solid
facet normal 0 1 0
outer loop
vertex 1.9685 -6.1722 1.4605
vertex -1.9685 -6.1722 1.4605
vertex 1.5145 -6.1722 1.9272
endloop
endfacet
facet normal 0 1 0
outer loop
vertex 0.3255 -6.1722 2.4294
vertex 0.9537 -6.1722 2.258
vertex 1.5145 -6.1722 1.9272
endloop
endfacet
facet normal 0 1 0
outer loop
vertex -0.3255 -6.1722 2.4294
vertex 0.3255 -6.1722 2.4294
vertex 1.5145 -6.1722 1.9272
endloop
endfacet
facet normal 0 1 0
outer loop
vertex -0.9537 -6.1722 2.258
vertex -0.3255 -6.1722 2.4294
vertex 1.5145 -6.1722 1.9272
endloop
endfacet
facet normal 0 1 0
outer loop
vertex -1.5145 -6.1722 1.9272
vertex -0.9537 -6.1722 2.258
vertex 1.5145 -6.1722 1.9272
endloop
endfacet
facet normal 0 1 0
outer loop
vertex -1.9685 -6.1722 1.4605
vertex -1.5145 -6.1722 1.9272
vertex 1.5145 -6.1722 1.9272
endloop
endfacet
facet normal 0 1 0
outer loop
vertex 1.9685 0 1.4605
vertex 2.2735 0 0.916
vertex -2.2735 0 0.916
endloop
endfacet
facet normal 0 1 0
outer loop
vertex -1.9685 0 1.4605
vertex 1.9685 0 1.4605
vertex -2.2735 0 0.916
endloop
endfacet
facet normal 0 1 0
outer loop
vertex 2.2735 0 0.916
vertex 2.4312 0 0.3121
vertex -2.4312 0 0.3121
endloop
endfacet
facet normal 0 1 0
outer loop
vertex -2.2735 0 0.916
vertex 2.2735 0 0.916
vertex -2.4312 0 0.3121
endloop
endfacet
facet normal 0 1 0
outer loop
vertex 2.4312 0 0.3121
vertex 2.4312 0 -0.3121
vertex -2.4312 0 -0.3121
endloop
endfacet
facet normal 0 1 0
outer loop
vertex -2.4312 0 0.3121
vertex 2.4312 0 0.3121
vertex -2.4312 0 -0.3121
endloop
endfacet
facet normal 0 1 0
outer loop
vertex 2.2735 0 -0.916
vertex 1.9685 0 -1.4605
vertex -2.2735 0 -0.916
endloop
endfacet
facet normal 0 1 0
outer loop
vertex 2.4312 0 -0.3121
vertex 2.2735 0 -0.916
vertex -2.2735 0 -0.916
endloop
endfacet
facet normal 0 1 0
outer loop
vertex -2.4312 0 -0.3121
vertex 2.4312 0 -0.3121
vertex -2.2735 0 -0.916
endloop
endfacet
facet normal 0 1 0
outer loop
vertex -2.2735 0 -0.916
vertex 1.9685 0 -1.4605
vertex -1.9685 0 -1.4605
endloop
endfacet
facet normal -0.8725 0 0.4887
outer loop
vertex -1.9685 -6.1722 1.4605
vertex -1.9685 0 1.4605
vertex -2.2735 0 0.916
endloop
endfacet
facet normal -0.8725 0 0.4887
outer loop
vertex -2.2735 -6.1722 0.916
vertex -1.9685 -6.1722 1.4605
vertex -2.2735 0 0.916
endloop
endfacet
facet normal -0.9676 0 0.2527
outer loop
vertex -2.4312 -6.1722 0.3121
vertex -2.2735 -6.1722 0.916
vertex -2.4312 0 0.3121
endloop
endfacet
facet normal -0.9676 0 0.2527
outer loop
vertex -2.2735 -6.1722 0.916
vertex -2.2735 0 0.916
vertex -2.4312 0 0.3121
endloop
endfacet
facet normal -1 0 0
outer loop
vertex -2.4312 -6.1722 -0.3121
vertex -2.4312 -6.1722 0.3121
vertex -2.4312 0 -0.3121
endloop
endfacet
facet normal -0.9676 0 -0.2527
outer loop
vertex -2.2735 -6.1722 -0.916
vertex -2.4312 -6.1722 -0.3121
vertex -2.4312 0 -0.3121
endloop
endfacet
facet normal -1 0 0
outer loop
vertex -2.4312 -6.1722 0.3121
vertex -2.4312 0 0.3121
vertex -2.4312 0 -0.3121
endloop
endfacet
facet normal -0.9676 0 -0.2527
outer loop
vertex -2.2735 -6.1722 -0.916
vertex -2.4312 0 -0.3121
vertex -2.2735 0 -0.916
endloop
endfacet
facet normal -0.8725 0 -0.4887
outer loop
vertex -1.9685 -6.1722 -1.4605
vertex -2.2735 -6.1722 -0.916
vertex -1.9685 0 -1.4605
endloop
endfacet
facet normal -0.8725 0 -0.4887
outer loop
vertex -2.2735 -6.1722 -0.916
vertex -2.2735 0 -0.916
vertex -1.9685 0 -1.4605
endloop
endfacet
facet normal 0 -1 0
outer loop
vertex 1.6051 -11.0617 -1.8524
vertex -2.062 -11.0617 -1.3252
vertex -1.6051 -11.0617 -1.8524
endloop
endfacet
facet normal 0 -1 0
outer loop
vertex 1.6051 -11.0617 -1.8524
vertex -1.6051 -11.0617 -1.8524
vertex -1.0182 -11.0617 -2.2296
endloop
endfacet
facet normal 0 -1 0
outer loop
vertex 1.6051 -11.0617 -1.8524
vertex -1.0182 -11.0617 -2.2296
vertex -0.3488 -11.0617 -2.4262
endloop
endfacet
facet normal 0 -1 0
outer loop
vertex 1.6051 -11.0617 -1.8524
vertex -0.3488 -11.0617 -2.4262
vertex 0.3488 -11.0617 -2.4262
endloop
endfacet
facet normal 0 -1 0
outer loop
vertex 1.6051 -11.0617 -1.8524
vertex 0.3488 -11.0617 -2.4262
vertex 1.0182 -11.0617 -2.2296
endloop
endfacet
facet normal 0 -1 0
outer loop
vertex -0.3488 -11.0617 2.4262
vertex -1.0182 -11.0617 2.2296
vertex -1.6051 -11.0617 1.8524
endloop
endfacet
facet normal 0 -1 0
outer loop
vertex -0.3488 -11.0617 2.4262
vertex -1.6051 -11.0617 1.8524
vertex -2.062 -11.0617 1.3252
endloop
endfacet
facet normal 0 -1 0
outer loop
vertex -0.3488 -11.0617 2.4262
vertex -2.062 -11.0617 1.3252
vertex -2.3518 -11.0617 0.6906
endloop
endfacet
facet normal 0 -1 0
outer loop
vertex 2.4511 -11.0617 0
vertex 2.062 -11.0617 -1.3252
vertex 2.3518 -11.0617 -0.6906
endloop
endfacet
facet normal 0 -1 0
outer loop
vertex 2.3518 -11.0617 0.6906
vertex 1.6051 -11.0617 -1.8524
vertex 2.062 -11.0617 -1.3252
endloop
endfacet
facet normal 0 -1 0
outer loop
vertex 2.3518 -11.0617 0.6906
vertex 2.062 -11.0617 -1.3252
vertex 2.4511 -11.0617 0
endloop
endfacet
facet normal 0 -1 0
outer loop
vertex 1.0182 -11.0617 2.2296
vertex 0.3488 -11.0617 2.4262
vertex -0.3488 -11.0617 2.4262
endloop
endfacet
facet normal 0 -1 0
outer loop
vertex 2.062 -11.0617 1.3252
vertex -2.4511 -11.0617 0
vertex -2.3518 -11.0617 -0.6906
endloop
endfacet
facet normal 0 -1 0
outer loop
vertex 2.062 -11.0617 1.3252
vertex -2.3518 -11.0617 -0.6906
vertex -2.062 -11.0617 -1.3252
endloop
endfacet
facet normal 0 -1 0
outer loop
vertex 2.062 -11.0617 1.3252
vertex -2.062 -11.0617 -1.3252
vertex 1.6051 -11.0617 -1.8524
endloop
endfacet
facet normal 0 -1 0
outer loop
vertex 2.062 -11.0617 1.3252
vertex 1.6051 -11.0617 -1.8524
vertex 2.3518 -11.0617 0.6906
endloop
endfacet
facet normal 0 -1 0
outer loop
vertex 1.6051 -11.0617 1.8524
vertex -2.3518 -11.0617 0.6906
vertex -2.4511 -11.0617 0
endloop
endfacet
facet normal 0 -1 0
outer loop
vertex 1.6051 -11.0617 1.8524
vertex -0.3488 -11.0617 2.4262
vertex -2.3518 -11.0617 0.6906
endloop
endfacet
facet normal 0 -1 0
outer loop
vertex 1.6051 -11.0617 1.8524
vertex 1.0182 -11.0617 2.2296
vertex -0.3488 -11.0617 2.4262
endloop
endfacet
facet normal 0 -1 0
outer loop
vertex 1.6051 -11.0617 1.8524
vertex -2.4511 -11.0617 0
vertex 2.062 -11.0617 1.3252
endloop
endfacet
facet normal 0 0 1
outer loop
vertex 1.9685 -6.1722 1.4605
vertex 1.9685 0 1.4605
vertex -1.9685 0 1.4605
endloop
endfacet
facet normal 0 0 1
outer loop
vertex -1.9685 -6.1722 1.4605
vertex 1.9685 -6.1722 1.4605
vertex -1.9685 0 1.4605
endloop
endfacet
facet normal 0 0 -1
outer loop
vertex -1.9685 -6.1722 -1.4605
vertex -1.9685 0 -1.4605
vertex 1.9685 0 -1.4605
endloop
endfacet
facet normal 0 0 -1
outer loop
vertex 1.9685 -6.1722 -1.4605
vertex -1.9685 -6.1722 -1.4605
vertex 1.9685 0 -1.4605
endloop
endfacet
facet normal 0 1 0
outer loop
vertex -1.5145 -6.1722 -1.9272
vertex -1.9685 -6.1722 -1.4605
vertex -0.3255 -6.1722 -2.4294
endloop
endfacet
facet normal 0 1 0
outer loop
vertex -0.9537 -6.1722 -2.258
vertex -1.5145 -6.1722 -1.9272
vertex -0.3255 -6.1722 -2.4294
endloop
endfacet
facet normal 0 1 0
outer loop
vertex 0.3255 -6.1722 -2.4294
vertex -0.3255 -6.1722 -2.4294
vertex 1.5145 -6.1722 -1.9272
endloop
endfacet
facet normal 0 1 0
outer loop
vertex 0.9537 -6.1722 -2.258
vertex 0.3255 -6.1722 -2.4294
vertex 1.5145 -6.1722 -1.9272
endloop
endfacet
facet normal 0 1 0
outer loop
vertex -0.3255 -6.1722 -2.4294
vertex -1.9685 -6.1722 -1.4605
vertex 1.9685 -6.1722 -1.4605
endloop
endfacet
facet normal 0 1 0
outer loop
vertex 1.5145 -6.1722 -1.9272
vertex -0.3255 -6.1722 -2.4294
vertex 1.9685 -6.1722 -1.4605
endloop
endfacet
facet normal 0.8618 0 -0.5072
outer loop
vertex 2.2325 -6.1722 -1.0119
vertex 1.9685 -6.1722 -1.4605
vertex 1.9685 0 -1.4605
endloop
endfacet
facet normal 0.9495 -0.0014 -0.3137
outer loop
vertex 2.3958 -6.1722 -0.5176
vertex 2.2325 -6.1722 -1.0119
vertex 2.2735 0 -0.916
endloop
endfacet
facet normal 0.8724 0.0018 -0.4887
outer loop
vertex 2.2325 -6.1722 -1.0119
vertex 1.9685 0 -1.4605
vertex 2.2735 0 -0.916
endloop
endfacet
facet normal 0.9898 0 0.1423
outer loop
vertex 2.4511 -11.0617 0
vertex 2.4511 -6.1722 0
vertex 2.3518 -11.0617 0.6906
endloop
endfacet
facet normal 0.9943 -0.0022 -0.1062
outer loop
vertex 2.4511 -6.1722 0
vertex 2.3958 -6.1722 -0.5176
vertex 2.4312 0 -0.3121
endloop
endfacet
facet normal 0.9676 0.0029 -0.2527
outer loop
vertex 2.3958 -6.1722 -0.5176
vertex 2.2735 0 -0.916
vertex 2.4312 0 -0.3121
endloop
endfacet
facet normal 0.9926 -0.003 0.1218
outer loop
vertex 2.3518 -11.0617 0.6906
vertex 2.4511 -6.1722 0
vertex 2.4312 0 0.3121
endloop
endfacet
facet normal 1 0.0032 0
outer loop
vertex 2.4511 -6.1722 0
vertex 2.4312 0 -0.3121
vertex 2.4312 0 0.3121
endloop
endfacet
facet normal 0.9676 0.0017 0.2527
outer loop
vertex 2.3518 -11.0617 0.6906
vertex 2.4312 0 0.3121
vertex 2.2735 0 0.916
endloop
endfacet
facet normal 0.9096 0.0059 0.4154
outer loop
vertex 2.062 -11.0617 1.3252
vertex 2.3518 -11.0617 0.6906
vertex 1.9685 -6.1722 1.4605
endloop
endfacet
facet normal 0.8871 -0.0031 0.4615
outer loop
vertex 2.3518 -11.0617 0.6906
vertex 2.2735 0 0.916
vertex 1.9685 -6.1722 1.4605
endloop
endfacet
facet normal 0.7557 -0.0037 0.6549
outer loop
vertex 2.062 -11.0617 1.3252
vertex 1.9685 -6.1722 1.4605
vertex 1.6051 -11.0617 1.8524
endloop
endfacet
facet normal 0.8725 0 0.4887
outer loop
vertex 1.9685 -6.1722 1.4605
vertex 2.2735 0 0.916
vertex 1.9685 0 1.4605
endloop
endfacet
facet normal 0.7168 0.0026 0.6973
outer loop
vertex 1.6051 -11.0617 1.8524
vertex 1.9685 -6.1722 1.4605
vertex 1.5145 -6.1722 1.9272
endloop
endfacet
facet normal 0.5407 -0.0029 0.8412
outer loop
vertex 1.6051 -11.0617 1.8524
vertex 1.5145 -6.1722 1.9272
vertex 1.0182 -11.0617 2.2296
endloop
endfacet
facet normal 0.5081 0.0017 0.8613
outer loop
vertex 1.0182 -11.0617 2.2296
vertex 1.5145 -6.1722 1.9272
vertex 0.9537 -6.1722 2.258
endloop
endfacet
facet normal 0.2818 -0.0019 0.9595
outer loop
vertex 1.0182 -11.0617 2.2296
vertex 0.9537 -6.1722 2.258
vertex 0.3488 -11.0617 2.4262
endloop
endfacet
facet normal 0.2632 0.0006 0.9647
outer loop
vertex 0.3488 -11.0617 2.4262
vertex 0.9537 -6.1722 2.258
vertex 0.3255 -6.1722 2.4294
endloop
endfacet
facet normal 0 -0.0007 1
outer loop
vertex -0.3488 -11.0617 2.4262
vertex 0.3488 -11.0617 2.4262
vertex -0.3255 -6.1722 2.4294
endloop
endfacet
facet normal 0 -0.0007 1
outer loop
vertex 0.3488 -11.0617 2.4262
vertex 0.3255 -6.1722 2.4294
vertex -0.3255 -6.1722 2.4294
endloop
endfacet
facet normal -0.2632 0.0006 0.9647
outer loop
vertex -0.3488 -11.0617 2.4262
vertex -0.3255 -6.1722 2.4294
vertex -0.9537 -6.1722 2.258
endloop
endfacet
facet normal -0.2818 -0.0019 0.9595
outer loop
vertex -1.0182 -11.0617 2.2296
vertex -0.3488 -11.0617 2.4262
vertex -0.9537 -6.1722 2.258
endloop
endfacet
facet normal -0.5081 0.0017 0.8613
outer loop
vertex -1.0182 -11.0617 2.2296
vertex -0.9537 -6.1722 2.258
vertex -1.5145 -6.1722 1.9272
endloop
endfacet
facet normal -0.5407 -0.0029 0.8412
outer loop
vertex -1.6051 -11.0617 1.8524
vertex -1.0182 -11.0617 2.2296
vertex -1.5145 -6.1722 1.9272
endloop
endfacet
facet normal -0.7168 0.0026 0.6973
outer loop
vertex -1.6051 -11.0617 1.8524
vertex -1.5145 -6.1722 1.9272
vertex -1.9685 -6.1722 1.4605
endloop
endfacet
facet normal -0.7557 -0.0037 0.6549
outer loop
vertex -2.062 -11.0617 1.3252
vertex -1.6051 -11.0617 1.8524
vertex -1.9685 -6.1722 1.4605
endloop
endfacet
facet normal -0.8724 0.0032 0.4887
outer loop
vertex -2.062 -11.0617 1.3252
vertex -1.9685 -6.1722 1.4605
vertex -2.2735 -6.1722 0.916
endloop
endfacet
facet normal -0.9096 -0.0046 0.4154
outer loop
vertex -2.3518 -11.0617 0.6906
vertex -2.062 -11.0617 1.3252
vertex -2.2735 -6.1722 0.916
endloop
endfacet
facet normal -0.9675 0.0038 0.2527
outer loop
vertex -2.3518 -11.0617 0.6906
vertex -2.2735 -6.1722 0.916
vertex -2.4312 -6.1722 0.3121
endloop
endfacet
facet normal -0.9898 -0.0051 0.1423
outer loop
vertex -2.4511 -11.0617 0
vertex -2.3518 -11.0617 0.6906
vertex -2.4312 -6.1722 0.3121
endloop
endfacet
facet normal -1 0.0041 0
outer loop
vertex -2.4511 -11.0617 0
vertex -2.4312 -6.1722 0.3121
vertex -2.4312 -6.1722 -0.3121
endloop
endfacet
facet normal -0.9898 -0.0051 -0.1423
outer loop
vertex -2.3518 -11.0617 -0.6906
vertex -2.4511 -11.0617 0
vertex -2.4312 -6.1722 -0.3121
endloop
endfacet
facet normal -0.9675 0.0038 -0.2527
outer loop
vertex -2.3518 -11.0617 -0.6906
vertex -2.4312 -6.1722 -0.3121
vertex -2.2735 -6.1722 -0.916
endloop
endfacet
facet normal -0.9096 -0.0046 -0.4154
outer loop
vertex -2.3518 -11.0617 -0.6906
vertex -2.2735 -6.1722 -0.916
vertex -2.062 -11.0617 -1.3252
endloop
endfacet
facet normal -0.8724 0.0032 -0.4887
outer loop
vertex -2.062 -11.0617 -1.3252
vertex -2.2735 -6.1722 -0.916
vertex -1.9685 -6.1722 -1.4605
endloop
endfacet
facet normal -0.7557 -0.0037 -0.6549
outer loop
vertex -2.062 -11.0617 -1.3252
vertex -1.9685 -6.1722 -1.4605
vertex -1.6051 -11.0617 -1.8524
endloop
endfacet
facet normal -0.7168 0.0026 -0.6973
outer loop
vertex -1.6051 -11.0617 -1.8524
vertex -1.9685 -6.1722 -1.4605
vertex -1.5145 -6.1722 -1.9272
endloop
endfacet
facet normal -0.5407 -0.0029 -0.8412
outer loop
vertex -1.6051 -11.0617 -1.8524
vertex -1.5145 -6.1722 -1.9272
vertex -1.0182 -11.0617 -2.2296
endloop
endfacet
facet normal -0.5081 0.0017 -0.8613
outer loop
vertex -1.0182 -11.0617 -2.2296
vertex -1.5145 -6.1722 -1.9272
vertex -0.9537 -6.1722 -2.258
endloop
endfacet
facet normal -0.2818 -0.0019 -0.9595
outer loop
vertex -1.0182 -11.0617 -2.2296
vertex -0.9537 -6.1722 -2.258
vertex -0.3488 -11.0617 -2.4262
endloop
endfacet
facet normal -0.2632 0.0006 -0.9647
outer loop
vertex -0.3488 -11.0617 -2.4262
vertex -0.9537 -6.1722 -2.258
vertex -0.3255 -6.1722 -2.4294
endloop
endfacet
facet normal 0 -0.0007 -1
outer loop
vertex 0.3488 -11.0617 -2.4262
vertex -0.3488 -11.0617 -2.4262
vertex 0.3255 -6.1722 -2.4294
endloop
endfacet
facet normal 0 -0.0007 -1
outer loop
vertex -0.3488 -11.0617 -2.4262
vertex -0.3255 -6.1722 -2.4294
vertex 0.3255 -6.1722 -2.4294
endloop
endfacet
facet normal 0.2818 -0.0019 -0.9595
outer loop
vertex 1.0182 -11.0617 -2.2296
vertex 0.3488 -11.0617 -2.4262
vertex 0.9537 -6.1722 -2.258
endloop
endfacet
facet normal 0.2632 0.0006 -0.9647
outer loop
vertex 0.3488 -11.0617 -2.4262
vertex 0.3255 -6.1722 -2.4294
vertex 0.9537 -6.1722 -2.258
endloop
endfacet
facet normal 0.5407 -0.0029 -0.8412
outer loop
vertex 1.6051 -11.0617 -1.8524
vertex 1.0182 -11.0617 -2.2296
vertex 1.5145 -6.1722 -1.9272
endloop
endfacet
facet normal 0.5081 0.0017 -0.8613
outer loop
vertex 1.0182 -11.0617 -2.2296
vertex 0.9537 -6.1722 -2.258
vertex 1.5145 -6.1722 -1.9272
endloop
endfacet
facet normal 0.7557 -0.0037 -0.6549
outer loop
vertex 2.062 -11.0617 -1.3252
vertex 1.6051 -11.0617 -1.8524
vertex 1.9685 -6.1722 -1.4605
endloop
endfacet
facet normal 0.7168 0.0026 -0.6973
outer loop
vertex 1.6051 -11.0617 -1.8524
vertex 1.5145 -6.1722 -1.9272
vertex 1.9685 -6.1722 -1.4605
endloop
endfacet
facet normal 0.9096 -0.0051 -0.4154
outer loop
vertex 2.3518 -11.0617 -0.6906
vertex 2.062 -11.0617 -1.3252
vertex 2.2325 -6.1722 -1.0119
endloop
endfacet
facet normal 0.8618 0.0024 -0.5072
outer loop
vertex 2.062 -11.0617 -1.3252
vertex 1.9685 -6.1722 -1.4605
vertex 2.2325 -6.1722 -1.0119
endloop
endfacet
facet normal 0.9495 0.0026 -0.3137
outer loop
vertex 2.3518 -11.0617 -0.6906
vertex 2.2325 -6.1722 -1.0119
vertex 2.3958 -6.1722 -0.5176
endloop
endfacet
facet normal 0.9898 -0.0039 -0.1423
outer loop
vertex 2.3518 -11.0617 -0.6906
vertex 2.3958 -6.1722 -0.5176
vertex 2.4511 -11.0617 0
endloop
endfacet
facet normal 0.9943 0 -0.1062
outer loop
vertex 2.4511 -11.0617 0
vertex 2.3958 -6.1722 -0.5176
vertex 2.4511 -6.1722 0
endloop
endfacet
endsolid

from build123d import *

# Parameters (mm, degrees)
BOSS_EXTRUDE1_DEPTH = 6.1722
SKETCH3_R           = 2.4511
BOSS_EXTRUDE2_DEPTH = 4.8895


with BuildPart() as part:
    # Sketch2 → Boss-Extrude1 (new body)
    with BuildSketch(Plane(origin=(0, 0, 0), x_dir=(1, 0, 0), z_dir=(0, 1, 0))):
        with BuildLine():
            Line((-1.968459032, 1.4605), (1.968459032, 1.4605))
            ThreePointArc((1.968459032, 1.4605), (2.4511, 0), (1.968459032, -1.4605))
            Line((1.968459032, -1.4605), (-1.968459032, -1.4605))
            ThreePointArc((-1.968459032, -1.4605), (-2.4511, 0), (-1.968459032, 1.4605))
        make_face()
    extrude(amount=-BOSS_EXTRUDE1_DEPTH)

    # Sketch3 → Boss-Extrude2 (add)
    with BuildSketch(Plane.XZ.offset(6.1722)):
        Circle(SKETCH3_R)
    extrude(amount=BOSS_EXTRUDE2_DEPTH)


solid = part.part
